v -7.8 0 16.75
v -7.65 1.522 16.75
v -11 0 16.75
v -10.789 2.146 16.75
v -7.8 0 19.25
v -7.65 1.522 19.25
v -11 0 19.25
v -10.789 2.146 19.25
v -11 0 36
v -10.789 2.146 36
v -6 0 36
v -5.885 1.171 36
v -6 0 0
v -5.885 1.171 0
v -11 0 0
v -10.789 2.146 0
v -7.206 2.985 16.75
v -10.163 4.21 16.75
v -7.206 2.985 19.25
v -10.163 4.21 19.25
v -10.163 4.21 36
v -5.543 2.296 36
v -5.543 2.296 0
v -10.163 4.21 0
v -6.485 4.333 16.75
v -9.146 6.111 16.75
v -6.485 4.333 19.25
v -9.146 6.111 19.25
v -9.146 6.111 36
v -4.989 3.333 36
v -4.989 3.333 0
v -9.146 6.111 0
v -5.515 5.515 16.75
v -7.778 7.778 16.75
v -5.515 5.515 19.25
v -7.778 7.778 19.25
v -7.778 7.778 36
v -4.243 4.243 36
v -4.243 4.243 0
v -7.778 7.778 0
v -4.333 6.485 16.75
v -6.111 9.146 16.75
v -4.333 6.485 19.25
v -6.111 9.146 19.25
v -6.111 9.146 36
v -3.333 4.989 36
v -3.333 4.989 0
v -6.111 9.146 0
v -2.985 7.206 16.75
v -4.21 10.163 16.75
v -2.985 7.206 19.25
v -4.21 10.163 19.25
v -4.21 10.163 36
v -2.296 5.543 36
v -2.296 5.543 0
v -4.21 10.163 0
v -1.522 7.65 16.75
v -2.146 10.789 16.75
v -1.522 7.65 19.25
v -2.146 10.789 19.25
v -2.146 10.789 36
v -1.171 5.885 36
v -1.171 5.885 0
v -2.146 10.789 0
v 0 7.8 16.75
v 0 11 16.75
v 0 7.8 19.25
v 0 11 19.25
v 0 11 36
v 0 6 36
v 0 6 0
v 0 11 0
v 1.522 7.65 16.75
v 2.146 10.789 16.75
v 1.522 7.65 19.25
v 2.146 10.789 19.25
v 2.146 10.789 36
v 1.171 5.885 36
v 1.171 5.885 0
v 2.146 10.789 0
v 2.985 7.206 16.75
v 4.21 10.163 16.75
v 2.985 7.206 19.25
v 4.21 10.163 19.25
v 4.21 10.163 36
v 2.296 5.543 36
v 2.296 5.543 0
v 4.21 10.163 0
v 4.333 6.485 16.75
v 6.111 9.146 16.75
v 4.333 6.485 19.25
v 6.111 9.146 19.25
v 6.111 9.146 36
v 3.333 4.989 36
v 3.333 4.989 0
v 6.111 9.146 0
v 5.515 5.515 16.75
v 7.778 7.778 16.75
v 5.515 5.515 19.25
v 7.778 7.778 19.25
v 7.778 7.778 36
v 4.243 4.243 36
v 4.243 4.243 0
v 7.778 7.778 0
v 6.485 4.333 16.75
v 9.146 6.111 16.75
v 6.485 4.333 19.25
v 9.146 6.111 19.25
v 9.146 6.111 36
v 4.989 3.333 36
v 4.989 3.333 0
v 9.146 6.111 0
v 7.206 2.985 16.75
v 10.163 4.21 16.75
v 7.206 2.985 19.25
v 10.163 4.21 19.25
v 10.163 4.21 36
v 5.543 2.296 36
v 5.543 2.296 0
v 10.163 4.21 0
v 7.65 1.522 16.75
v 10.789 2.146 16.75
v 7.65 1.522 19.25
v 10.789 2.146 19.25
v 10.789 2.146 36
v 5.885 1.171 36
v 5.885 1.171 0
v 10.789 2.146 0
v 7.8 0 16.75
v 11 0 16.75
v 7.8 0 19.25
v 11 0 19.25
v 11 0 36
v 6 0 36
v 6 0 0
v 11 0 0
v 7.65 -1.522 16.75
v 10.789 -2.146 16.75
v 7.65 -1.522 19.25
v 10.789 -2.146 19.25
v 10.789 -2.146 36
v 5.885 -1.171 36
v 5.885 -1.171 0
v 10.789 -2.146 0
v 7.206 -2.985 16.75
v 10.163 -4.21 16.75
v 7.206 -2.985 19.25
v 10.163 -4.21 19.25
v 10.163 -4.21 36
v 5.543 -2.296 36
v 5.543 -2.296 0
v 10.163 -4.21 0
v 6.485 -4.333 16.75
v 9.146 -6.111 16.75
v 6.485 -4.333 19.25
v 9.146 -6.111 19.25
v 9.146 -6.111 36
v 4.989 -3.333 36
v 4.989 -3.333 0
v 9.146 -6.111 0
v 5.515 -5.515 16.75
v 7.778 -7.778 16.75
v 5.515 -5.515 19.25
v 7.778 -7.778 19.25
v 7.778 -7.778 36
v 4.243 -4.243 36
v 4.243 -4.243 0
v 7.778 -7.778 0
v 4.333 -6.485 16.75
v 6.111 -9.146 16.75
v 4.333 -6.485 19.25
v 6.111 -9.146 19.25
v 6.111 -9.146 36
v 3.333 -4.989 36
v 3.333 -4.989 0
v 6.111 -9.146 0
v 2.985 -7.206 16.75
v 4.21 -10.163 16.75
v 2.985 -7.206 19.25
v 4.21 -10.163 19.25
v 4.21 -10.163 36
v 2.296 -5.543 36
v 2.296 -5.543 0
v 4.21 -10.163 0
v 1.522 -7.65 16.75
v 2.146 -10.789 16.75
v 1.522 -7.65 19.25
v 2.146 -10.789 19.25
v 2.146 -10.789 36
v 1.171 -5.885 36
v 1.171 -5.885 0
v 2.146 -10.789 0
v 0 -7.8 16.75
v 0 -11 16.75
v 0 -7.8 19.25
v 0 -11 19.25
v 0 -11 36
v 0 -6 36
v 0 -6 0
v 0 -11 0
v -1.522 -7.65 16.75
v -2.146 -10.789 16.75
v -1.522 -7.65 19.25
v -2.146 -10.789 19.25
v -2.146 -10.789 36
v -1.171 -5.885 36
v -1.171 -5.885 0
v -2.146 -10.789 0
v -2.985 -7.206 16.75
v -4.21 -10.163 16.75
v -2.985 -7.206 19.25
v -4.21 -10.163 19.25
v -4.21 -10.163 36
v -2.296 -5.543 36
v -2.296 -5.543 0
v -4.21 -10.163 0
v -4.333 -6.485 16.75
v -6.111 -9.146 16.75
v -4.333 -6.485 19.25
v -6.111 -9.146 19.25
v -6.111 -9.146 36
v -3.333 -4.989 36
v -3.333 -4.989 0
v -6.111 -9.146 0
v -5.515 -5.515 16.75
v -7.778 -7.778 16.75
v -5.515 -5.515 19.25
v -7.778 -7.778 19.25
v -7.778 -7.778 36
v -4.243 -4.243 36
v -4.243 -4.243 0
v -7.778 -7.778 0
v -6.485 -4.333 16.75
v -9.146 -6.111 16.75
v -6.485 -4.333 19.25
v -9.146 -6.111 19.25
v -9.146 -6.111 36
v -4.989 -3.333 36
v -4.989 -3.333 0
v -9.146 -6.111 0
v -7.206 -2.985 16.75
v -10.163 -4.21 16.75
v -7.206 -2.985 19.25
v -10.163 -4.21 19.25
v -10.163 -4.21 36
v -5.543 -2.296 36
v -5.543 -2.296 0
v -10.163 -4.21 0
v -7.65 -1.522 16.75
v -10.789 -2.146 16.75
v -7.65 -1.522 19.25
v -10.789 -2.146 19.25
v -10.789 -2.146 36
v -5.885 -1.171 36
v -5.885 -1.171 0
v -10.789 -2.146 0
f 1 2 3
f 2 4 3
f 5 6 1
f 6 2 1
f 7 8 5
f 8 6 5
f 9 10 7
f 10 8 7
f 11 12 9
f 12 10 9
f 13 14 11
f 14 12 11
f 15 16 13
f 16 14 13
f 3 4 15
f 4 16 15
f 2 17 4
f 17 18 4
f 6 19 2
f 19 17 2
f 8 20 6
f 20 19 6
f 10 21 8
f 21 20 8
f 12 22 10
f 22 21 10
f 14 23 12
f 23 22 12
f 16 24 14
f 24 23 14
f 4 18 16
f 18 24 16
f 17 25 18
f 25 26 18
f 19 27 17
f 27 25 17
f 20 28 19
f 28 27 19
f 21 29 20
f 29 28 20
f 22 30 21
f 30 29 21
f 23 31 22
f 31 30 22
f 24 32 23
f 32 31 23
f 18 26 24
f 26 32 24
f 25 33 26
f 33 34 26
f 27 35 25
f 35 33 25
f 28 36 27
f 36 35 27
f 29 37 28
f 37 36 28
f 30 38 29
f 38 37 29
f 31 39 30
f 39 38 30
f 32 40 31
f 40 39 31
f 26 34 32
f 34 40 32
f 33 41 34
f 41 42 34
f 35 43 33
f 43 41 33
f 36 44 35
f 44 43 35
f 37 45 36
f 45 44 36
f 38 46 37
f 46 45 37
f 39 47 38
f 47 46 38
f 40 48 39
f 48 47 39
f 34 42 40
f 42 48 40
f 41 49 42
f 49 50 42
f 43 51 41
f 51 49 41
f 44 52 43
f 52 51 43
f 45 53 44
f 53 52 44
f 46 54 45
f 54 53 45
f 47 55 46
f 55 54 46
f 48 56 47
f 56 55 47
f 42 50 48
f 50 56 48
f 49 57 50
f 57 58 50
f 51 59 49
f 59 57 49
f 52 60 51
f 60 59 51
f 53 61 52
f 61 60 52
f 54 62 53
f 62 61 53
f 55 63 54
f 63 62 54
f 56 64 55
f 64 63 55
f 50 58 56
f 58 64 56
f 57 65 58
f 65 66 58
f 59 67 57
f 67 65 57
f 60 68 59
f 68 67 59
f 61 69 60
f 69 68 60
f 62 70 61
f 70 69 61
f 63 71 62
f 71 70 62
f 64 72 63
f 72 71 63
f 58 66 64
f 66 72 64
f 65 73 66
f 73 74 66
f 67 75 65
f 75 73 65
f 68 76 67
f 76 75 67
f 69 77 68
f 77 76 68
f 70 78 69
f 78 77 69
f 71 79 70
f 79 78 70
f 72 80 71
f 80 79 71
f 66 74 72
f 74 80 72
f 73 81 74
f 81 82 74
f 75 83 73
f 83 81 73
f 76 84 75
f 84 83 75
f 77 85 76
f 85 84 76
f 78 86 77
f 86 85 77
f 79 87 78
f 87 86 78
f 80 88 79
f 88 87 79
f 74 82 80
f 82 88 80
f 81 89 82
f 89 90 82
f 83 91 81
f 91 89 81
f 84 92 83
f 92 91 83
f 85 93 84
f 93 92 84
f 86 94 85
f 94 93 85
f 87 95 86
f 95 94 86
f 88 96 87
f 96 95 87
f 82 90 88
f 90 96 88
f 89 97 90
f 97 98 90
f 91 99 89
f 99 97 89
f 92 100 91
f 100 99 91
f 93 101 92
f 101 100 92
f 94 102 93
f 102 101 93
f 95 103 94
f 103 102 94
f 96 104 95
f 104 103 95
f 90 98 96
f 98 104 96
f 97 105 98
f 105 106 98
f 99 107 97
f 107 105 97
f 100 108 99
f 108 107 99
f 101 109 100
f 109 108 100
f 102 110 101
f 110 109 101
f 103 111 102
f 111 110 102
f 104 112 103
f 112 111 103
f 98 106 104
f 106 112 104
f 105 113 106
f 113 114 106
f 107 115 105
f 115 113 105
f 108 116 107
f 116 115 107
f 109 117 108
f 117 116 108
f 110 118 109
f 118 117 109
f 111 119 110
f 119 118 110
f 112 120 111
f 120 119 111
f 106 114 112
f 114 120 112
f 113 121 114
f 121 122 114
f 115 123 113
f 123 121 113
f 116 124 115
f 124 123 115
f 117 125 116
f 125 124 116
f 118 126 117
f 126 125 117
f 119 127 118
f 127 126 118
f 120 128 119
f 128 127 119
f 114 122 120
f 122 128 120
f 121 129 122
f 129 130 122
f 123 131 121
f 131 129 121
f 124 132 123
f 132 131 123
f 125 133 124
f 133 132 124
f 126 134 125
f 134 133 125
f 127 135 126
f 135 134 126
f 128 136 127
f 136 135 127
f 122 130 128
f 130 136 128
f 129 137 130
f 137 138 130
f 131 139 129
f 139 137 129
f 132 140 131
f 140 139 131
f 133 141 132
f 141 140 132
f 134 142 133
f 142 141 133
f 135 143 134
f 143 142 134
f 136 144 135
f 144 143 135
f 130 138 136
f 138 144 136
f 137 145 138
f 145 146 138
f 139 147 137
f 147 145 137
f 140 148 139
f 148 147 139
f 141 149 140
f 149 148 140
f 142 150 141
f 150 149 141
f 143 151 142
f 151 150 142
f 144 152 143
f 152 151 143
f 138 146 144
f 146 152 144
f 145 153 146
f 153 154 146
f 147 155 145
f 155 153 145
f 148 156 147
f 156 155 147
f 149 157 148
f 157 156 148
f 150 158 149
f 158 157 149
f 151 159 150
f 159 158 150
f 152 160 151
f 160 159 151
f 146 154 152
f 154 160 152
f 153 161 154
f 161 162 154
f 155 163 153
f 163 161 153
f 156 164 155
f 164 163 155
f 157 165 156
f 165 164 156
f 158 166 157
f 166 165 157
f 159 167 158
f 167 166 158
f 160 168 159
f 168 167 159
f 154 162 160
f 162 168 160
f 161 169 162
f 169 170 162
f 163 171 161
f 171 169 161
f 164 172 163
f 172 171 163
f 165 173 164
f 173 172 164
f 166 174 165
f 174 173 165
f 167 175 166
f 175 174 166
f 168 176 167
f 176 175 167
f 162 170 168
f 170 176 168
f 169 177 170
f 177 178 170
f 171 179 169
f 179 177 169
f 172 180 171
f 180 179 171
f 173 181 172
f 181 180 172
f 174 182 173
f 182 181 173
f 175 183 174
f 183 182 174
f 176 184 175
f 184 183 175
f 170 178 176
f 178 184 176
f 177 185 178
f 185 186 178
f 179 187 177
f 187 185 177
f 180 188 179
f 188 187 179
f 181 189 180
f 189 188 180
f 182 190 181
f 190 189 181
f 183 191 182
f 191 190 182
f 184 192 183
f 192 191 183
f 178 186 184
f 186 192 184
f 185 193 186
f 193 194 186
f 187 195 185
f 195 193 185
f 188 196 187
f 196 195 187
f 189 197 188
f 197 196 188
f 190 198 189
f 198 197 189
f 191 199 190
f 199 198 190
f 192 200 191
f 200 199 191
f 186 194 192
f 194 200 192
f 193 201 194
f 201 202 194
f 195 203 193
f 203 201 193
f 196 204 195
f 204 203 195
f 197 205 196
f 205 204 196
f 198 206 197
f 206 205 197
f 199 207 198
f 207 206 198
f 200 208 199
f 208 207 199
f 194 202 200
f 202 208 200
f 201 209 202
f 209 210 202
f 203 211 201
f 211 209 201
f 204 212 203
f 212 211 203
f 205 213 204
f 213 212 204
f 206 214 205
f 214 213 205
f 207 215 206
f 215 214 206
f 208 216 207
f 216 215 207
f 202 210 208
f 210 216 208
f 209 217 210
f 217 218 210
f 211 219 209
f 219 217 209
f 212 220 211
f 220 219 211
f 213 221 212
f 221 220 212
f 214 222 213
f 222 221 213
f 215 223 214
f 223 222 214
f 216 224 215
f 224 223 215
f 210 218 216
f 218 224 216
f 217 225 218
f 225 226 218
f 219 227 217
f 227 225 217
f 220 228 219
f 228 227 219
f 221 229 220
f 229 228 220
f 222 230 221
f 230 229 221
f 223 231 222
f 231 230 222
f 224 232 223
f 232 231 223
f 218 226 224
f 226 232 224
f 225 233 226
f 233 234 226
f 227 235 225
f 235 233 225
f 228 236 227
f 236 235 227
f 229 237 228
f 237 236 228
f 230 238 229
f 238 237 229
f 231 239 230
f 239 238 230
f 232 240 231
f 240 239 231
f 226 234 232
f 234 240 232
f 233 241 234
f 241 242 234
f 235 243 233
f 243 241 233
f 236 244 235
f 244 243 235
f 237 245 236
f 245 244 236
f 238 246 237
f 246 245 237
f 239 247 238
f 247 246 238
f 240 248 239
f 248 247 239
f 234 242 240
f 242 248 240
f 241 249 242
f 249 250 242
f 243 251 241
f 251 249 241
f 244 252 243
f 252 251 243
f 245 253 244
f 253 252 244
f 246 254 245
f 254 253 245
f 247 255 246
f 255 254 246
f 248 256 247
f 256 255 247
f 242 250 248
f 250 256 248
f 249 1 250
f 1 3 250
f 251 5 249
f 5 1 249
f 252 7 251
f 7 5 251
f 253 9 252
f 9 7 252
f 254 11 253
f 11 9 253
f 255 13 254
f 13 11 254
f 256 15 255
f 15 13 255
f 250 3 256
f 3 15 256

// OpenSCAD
$fn = 32;

// ----------------------------------------------------------------------
// Grooved revolve: stepped, bore R6
// ----------------------------------------------------------------------

// --- parameters (mm) ---
bore_r = 6;               // bore radius
outer_r = 11;             // outer radius of the body
total_h = 36;             // overall height, Z
wall = 5;                 // radial wall thickness
groove_w = 2.5;           // groove width
groove_d = 3.2;           // groove depth
grooves = 1;              // number of outer grooves
fit_tol = 0.05;           // declared fit tolerance (prompt contract)
free_tol = 0.2;           // declared free tolerance (prompt contract)

bbox_x = 2 * outer_r;  // full diameter
bore_d = 2 * bore_r;  // bore diameter
body_d = 2 * outer_r;  // body diameter
revolve_angle = 360;  // full turn around the Z axis

profile = [[6, 0], [11, 0], [11, 16.75], [7.8, 16.75], [7.8, 19.25], [11, 19.25], [11, 36], [6, 36]];  // primary outline, 8 points, counter clockwise

// --- the one profile operation ---
rotate_extrude(angle = revolve_angle) polygon(points = profile);
